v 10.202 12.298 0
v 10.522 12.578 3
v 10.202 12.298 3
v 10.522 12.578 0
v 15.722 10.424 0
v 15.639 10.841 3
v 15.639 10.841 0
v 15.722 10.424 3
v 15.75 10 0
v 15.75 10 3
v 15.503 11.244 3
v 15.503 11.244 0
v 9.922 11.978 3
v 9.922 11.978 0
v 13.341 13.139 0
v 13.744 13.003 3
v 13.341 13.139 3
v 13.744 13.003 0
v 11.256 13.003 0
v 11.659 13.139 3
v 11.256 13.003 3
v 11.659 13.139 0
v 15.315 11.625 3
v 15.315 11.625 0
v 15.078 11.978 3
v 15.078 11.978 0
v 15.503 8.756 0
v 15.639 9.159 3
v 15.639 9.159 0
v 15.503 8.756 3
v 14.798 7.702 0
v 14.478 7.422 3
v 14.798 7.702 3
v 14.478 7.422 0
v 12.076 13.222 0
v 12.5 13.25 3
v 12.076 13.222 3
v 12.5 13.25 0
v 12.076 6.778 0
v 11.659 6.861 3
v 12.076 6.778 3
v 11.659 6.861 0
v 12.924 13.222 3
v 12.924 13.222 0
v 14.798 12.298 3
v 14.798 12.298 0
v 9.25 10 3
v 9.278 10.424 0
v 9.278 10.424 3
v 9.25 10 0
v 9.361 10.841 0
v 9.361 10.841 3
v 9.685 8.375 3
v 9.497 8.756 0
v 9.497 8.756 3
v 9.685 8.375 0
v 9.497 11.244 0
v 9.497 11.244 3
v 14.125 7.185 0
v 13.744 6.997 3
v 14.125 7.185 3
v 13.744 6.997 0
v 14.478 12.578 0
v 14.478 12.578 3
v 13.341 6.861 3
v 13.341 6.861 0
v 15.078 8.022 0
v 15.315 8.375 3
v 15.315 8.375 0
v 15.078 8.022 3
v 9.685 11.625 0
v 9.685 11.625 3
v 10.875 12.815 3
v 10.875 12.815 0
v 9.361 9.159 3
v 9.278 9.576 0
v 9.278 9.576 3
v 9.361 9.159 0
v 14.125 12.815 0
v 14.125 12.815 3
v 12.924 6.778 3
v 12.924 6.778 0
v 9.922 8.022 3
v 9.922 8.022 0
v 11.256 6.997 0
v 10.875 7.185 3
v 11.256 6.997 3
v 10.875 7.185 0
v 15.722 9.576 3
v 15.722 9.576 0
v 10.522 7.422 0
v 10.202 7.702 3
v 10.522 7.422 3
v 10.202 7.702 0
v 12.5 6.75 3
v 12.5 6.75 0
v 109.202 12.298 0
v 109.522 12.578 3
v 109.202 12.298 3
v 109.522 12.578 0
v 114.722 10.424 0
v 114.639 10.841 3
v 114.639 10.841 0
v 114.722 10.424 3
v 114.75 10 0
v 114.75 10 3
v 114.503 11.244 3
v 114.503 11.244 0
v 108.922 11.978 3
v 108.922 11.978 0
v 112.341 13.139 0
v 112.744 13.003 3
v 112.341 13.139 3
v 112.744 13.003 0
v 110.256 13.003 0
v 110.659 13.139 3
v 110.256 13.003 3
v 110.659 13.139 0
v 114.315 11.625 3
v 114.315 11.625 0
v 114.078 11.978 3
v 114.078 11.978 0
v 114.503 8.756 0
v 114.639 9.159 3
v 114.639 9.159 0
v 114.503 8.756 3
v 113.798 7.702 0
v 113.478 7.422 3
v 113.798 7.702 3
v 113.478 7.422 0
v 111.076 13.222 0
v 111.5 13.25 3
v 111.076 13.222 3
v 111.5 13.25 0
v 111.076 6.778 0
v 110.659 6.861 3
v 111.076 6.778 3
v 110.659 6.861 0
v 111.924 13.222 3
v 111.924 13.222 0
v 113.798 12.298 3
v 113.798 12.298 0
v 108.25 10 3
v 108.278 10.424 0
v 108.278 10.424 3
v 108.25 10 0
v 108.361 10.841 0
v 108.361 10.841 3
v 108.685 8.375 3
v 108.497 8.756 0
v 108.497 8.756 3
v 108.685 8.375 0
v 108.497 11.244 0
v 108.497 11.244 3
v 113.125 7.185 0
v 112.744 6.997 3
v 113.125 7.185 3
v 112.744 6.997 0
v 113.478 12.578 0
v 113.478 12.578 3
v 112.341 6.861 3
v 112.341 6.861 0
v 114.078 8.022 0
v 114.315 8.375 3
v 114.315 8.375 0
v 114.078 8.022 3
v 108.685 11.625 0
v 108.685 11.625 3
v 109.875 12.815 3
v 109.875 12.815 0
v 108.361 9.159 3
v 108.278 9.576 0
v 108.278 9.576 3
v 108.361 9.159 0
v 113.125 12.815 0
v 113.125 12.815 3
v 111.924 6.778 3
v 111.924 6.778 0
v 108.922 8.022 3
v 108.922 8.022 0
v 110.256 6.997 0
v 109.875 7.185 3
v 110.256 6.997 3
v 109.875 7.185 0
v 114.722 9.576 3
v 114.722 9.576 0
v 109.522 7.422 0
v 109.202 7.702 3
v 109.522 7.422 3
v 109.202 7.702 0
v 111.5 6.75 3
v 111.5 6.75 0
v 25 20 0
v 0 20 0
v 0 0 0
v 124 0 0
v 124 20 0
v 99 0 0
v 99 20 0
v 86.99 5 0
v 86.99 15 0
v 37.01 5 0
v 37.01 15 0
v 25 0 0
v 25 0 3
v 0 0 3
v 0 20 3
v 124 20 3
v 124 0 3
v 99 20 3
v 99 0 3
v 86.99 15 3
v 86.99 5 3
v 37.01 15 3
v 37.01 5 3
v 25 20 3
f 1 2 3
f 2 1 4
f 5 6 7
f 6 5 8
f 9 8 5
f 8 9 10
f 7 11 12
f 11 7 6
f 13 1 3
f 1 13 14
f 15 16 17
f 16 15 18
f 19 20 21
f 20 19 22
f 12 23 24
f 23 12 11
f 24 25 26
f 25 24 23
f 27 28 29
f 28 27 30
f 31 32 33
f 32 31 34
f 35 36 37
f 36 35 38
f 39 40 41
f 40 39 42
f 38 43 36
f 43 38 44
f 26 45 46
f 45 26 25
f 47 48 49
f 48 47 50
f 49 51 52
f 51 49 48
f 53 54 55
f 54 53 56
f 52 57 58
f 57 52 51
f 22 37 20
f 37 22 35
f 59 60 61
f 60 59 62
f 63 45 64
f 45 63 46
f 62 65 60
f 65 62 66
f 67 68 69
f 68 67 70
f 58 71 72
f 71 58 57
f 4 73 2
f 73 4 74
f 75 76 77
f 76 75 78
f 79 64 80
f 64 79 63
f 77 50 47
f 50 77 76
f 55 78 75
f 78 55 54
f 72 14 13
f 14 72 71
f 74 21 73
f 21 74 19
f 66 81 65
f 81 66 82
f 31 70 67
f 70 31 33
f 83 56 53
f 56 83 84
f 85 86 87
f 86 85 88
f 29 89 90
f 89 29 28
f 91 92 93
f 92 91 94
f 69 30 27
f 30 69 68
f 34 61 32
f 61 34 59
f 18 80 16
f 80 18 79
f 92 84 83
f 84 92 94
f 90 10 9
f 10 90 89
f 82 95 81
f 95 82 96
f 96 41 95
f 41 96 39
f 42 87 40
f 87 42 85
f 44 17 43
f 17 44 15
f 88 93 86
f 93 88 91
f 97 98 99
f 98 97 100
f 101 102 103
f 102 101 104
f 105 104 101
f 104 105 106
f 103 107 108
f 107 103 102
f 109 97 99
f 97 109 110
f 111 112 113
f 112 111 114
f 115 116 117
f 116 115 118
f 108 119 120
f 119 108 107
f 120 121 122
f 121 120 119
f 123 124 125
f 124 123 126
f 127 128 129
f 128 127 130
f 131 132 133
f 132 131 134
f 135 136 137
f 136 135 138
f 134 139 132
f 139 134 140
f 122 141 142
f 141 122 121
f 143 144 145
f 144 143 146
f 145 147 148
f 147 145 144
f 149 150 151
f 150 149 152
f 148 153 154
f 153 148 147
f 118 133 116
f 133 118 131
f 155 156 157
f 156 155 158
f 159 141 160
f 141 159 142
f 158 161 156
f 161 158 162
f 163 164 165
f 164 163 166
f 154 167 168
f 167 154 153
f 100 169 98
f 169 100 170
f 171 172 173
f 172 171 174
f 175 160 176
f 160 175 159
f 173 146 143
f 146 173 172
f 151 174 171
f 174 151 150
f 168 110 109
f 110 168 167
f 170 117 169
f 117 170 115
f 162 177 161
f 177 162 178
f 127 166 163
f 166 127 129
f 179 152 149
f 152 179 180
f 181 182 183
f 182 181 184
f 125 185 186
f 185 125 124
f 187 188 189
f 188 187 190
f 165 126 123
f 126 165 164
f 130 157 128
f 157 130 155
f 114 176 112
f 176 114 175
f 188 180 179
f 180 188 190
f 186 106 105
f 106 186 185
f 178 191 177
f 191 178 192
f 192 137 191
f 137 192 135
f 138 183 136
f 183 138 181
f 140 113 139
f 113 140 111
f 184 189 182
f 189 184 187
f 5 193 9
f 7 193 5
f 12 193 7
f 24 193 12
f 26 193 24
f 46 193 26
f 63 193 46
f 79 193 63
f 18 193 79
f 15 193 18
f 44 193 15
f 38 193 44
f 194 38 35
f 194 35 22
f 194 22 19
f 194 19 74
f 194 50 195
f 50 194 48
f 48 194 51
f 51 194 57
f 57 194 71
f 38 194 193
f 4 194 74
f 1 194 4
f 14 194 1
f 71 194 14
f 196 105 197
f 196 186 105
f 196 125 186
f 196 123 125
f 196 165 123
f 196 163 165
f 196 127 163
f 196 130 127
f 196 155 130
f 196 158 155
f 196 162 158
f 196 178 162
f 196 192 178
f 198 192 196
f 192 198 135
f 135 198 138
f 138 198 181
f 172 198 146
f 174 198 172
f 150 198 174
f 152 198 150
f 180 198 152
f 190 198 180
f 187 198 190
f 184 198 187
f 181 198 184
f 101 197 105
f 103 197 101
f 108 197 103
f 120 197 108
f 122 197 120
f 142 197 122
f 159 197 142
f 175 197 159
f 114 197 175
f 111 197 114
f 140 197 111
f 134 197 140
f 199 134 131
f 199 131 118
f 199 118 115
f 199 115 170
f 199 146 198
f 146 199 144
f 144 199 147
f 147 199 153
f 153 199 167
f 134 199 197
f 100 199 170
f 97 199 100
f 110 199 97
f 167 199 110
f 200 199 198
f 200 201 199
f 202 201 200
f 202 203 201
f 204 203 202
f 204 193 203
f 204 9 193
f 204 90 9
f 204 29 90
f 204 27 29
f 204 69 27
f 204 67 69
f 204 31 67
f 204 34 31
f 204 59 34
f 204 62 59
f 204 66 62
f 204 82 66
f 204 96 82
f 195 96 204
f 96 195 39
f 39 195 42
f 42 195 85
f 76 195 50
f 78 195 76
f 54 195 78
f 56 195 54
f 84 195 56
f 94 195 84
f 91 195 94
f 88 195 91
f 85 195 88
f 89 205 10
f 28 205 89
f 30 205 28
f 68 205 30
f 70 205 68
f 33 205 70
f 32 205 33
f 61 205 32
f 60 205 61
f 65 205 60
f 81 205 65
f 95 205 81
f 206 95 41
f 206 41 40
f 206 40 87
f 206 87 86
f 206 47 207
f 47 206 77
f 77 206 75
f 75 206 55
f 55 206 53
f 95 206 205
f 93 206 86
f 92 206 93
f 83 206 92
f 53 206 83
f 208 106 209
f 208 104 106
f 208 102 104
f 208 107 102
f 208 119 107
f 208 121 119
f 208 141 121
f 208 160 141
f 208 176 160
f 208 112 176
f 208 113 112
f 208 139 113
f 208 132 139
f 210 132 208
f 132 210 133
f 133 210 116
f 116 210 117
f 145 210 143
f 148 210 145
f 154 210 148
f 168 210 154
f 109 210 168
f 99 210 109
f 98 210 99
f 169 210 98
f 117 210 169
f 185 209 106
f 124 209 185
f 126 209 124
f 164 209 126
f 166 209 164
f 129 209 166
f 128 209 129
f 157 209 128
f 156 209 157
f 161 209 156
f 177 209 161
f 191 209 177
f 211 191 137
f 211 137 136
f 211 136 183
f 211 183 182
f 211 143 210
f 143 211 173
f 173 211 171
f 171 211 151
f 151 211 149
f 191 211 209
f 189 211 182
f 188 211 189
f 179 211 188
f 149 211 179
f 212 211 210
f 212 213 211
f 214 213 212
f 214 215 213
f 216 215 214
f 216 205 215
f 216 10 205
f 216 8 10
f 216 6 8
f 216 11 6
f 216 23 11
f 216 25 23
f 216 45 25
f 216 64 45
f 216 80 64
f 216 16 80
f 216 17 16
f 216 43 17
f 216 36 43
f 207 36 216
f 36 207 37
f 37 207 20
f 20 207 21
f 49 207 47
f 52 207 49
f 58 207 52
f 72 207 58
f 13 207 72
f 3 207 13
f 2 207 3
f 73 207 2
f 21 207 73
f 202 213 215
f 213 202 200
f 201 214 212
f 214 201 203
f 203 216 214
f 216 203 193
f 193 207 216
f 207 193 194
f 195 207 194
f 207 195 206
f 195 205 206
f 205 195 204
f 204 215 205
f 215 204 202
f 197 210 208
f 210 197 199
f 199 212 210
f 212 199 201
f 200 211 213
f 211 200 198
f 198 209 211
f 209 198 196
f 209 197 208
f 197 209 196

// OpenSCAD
// Rigid + TPU bond-test coupons for the Snapmaker U1
// rigidflex by garage78 · CC BY 4.0
//
// Dog-bone shape (wide grips, narrow gauge section) so the coupon fails at the
// joint, not at the pin hole. The 10 x 3 mm gauge section keeps peak forces
// within the range of a 50 kg load cell (see scad/pull_rig.scad).
//
// Export each body separately (part = "rigid" / "flex"); `rigidflex kit coupon`
// does this and packs both into one two-material 3MF.
//
// Coupon A: in-plane butt joint (rigid and TPU side by side in the same layers)
// Coupon B: lap joint (TPU printed on the rigid material, or the reverse)
// Graded A (buffer > 0): rigid | buffer band of a stiffer TPU | soft TPU, three materials in one part
// All print flat, with no supports.

/* [Which coupon] */
coupon = "A";            // ["A", "B"]
part   = "both";         // ["both", "rigid", "buffer", "flex"]

/* [Shape] */
width      = 10;         // mm, gauge-section width
grip_w     = 20;         // mm, grip width
thickness  = 3;          // mm
grip_len   = 25;         // mm
taper_len  = 12;         // mm, grip-to-gauge transition
gauge_len  = 50;         // mm, narrow section with the joint in the middle
hole_d     = 6.5;        // mm, M6 pin

/* [Coupon A: butt joint] */
joint       = "dovetail"; // ["flat", "sawtooth", "dovetail"]
tooth_pitch = 2.5;        // mm
tooth_depth = 2.5;        // mm
buffer      = 0;          // mm, graded joint: band of intermediate TPU between rigid and soft TPU (0 = none)

/* [Coupon B: lap joint] */
overlap     = 20;         // mm (must be shorter than gauge_len)
rigid_below = true;       // true: TPU printed on rigid; false: rigid printed on TPU

$fn = 48;
L  = 2*grip_len + 2*taper_len + gauge_len;
xm = L/2;                // joint centre
yc = grip_w/2;           // centre line

// ---------- outline ----------
module outline() {
    hull() { square([grip_len, grip_w]); translate([grip_len + taper_len, yc - width/2]) square([0.01, width]); }
    translate([grip_len + taper_len, yc - width/2]) square([gauge_len, width]);
    hull() { translate([L - grip_len, 0]) square([grip_len, grip_w]); translate([L - grip_len - taper_len - 0.01, yc - width/2]) square([0.01, width]); }
}
module holes() {
    for (x = [grip_len/2, L - grip_len/2]) translate([x, yc, -1]) cylinder(d=hole_d, h=thickness+2);
}

// ---------- coupon A: everything left of the joint line is rigid ----------
module rigid_side_2d() {
    y0 = yc - width/2;
    n  = round(width / tooth_pitch);
    union() {
        translate([-1, -1]) square([xm - tooth_depth/2 + 1, grip_w + 2]);
        if (joint == "sawtooth")
            for (i = [0:n-1]) translate([xm - tooth_depth/2, y0 + i*tooth_pitch])
                polygon([[0,0],[tooth_depth, tooth_pitch/2],[0, tooth_pitch]]);
        else if (joint == "dovetail")
            for (i = [0:2:n-1]) translate([xm - tooth_depth/2, y0 + i*tooth_pitch])
                // tips run 10 µm past the tooth band so an edge tooth crosses the coupon edge instead of touching it at
                // one point (a pinched TPU region that older CGAL refuses to export)
                polygon([[0, tooth_pitch*0.25],[tooth_depth, -0.01],[tooth_depth, tooth_pitch + 0.01],[0, tooth_pitch*0.75]]);
        else // flat
            translate([xm - tooth_depth/2, -1]) square([tooth_depth/2, grip_w + 2]);
    }
}
module A_rigid()  { difference() { linear_extrude(thickness) intersection() { outline(); rigid_side_2d(); } holes(); } }
module A_buffer() { difference() { linear_extrude(thickness) difference() { intersection() { outline(); translate([buffer, 0]) rigid_side_2d(); } rigid_side_2d(); } holes(); } }
module A_flex()   { difference() { linear_extrude(thickness) difference()   { outline(); rigid_side_2d(); translate([buffer, 0]) rigid_side_2d(); } holes(); } }

// ---------- coupon B: lap joint centred on the gauge section ----------
x0 = xm - overlap/2;
h  = thickness/2;
module B_rigid() {
    difference() {
        intersection() {
            linear_extrude(thickness) outline();
            union() {
                translate([-1, -1, -1]) cube([x0 + 1, grip_w + 2, thickness + 2]);
                translate([x0, -1, rigid_below ? 0 : h]) cube([overlap, grip_w + 2, h]);
            }
        }
        holes();
    }
}
module B_flex() {
    difference() {
        intersection() {
            linear_extrude(thickness) outline();
            union() {
                translate([x0 + overlap, -1, -1]) cube([L, grip_w + 2, thickness + 2]);
                translate([x0, -1, rigid_below ? h : 0]) cube([overlap, grip_w + 2, h]);
            }
        }
        holes();
    }
}

if (coupon == "A") {
    if (part == "both" || part == "rigid")  color("SteelBlue") A_rigid();
    if ((part == "both" || part == "buffer") && buffer > 0) color("Gold") A_buffer();
    if (part == "both" || part == "flex")   color("Orange")    A_flex();
} else {
    if (part == "both" || part == "rigid") color("SteelBlue") B_rigid();
    if (part == "both" || part == "flex")  color("Orange")    B_flex();
}
